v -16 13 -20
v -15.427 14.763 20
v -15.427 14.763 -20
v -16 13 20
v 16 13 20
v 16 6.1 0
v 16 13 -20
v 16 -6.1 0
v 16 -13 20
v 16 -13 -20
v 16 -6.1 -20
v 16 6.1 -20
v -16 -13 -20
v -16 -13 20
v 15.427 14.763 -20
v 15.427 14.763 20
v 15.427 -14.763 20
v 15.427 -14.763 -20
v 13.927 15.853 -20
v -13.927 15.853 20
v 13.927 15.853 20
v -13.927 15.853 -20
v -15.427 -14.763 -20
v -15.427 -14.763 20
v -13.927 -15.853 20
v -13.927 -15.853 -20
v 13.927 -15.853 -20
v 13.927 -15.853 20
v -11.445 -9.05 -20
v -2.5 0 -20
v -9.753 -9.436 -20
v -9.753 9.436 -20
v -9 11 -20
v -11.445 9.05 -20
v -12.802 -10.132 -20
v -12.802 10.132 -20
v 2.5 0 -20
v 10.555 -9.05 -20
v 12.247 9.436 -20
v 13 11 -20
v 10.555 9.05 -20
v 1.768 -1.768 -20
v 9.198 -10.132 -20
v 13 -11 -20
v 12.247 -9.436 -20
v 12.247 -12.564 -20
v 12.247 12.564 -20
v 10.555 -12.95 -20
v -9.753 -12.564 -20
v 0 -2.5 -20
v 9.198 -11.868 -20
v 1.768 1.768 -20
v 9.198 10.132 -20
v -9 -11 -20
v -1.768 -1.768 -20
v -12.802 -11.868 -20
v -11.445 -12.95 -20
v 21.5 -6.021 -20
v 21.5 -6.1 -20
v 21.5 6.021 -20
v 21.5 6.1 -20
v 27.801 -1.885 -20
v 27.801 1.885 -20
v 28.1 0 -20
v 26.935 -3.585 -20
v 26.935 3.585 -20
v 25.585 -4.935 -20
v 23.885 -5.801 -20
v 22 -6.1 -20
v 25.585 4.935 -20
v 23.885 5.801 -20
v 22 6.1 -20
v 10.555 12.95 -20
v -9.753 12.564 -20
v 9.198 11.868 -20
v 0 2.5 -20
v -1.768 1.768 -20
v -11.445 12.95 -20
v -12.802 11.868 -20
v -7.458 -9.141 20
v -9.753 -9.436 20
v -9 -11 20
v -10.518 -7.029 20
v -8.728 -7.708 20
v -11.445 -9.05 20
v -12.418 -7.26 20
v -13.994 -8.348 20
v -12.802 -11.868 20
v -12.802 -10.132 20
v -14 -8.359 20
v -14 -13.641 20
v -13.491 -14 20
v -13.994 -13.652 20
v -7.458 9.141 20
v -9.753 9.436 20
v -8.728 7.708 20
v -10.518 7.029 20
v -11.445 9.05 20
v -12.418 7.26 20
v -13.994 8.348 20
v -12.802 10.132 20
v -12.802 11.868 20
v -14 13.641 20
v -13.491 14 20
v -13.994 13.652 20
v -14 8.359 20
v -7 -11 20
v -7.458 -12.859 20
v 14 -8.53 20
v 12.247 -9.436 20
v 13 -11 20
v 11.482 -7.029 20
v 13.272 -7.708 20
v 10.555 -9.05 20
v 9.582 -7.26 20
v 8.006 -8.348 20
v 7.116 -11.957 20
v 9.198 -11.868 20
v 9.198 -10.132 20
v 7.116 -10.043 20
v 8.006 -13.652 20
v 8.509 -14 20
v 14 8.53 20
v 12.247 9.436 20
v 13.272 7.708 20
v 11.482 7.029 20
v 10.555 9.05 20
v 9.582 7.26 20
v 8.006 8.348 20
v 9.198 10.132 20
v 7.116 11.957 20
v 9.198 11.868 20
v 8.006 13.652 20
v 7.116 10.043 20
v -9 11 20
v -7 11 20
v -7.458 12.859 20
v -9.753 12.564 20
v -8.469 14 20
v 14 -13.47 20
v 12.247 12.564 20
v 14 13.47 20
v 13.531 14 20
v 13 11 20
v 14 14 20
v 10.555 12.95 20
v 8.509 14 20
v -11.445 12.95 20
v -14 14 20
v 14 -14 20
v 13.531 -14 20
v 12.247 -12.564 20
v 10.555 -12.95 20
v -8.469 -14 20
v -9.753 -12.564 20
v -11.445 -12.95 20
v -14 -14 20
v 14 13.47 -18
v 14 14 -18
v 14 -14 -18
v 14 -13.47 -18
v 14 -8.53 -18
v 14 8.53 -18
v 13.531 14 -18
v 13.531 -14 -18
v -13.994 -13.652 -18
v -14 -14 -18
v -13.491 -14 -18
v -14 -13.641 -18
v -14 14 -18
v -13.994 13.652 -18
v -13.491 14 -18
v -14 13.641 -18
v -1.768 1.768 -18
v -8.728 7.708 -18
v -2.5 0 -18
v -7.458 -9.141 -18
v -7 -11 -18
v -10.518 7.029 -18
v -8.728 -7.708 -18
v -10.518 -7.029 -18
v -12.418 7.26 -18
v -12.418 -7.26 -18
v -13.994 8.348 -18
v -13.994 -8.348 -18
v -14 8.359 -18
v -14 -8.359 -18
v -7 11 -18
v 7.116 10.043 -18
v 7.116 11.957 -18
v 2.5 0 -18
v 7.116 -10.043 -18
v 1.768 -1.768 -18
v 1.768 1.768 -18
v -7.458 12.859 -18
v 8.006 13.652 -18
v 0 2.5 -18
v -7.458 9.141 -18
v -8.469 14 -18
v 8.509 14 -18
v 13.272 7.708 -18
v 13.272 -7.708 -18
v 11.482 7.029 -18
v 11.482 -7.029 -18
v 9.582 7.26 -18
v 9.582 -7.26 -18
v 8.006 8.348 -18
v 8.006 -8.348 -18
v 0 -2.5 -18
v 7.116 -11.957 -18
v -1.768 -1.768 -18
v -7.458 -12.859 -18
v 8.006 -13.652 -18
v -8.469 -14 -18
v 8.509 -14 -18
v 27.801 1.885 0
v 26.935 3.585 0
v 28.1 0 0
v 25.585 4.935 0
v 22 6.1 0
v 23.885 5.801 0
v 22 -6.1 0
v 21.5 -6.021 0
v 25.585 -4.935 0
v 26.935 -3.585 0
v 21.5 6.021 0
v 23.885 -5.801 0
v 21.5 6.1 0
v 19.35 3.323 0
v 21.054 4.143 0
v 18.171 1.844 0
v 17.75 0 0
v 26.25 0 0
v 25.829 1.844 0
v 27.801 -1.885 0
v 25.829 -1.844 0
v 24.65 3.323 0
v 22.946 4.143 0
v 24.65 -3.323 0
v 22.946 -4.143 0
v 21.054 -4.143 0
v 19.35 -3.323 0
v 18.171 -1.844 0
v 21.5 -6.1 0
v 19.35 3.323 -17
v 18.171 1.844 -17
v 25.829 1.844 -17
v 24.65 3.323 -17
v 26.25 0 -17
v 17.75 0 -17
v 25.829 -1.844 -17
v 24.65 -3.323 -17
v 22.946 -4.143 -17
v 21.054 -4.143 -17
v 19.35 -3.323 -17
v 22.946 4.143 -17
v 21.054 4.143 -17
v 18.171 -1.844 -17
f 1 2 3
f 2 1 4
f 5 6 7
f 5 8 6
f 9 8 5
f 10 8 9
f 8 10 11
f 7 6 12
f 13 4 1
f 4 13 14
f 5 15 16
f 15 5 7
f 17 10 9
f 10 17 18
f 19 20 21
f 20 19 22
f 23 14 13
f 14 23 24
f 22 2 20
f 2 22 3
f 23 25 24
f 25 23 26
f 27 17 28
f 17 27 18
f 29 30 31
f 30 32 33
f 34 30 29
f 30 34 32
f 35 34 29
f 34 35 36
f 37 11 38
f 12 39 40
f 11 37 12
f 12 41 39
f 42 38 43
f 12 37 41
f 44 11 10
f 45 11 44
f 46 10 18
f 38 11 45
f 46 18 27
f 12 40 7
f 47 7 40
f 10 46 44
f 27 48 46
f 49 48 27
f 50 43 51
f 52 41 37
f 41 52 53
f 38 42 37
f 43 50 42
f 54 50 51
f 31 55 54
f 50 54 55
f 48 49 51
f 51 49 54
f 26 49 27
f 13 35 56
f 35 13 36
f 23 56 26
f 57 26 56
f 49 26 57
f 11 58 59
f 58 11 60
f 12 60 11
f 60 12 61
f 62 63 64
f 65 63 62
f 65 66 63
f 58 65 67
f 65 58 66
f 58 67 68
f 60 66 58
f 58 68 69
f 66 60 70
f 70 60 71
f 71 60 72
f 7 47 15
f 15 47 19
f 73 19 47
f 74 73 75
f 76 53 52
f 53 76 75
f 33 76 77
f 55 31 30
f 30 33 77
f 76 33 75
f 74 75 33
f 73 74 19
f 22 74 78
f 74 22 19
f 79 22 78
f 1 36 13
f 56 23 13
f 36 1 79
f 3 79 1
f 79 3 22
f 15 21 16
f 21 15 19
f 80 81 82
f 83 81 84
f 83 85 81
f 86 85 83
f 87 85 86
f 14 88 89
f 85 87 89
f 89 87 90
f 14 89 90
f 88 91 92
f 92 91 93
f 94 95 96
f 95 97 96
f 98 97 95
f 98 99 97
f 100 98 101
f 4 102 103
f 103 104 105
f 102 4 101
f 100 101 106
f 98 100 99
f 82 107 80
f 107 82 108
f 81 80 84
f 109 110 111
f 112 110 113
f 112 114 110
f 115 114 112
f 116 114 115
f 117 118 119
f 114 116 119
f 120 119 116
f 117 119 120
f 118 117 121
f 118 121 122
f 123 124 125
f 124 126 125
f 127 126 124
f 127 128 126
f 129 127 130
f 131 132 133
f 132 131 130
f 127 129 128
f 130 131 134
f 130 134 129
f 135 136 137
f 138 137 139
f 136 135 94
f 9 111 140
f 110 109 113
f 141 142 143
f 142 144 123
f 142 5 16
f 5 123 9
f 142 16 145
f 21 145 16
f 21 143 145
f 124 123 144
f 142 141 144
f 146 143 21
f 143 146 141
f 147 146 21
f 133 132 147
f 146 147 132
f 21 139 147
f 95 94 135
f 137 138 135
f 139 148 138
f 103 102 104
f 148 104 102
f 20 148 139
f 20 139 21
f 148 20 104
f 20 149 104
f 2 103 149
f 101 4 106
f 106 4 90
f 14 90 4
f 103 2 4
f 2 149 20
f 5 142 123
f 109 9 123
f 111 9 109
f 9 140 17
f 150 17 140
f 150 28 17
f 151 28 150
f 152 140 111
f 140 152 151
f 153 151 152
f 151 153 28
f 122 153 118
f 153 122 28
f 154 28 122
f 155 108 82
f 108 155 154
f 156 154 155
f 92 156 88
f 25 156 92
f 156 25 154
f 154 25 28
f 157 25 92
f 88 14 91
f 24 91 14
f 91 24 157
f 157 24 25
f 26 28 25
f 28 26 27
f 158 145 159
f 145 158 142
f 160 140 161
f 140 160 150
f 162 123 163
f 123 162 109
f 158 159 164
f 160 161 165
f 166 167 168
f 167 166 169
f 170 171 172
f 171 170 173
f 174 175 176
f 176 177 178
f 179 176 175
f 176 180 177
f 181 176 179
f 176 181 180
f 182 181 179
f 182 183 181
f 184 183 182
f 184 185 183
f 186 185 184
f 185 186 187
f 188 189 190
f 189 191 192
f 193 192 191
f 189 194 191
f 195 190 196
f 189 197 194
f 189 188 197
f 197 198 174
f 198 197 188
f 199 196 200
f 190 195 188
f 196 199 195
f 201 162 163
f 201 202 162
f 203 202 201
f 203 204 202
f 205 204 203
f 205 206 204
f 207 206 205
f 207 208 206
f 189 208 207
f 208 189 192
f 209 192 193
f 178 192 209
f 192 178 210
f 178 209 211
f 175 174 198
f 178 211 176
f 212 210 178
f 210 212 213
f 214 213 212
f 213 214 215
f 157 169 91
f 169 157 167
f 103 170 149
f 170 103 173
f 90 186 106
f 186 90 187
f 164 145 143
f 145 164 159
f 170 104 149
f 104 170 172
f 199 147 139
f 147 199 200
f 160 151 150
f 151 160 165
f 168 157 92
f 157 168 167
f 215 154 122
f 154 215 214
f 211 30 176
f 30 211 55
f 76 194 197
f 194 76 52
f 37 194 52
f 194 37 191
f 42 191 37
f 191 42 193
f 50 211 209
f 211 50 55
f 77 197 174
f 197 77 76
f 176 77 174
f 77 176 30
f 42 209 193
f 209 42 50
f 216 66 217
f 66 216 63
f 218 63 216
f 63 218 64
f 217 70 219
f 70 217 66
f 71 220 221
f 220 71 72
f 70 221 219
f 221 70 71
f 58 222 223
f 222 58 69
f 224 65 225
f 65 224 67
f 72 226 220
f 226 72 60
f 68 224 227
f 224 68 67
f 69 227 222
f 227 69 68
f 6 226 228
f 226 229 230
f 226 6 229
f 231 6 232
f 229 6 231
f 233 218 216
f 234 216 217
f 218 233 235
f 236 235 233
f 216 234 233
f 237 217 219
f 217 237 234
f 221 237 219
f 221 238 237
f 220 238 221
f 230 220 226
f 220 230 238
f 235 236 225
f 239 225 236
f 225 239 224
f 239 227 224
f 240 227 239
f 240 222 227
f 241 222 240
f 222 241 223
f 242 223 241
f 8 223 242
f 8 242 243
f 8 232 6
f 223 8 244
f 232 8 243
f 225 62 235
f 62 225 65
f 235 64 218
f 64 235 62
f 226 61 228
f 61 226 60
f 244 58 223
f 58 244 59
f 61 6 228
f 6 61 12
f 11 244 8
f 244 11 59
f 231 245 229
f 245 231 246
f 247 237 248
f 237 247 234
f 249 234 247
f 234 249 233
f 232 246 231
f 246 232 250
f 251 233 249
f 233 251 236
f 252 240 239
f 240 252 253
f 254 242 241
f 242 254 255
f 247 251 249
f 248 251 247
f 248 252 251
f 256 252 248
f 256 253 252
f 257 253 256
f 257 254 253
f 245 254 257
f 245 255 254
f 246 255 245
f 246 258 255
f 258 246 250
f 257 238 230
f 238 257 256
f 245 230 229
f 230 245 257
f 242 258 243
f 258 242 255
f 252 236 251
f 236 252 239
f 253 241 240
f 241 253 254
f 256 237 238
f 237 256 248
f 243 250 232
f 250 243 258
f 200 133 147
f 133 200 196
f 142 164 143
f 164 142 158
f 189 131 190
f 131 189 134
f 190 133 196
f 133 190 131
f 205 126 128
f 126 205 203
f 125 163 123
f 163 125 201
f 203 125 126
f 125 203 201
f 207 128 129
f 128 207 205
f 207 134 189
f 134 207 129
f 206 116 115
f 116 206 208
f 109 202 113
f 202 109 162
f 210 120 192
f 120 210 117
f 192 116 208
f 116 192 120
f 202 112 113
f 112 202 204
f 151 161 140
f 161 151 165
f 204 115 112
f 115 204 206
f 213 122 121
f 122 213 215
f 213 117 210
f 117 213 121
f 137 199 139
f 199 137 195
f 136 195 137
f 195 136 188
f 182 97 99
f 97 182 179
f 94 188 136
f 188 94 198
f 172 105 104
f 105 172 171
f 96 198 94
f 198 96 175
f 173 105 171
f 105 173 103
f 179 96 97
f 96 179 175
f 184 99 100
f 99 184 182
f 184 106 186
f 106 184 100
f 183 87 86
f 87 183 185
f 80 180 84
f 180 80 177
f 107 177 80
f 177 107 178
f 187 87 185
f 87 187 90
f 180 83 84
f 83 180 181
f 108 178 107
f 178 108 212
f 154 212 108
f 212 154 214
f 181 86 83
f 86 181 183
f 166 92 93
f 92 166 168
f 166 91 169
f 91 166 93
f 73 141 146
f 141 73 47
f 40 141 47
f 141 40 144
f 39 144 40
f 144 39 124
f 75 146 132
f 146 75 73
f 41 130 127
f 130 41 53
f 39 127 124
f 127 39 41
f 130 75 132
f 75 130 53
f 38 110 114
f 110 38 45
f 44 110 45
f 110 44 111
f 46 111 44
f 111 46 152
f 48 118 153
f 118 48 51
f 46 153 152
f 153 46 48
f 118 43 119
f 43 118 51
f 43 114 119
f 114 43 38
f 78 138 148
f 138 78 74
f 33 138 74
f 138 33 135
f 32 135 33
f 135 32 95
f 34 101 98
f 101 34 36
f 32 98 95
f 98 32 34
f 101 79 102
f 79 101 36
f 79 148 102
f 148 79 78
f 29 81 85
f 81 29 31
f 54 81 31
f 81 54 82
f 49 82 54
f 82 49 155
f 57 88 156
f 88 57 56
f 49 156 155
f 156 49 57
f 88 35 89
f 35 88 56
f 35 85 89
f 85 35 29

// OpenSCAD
/*
 * Written by Dermot Tynan, Kalopa Research.
 * GPLv2.
 *
 * Cap to prevent water ingress into the WDI.
 *
 * All dimensions are in mm.
 */
module wdi_box()
{
	difference() {
		minkowski() {
			cube([26, 26, 20], center = true);
			cylinder(r = 3, h = 20, center = true);
		}
		translate([0, 0, 2]) cube([28, 28, 40], center = true);
		cylinder(r = 5/2, h = 50, center = true);
	}
}

module shaft_mount()
{
	difference() {
		union() {
			cylinder(r = 6.1, h = 20, center = true);
			translate([-4, 0, 0]) cube([7, 12.2, 20], center = true);
		}
		translate([0, 0, 3]) cylinder(r = 4.25, h = 20, center = true);
	}
}
module wdi_housing()
{
	difference() {
		union() {
			wdi_box();
			translate([11, 11, 0]) cylinder(r = 4, h = 40, center = true);
			translate([11, -11, 0]) cylinder(r = 4, h = 40, center = true);
			translate([-11, 11, 0]) cylinder(r = 4, h = 40, center = true);
			translate([-11, -11, 0]) cylinder(r = 4, h = 40, center = true);
			translate([22, 0, -10]) shaft_mount();
		}
		translate([11, 11, 0]) cylinder(r = 4/2, h = 50, center = true);
		translate([11, -11, 0]) cylinder(r = 4/2, h = 50, center = true);
		translate([-11, 11, 0]) cylinder(r = 4/2, h = 50, center = true);
		translate([-11, -11, 0]) cylinder(r = 4/2, h = 50, center = true);
	}
}

wdi_housing();
